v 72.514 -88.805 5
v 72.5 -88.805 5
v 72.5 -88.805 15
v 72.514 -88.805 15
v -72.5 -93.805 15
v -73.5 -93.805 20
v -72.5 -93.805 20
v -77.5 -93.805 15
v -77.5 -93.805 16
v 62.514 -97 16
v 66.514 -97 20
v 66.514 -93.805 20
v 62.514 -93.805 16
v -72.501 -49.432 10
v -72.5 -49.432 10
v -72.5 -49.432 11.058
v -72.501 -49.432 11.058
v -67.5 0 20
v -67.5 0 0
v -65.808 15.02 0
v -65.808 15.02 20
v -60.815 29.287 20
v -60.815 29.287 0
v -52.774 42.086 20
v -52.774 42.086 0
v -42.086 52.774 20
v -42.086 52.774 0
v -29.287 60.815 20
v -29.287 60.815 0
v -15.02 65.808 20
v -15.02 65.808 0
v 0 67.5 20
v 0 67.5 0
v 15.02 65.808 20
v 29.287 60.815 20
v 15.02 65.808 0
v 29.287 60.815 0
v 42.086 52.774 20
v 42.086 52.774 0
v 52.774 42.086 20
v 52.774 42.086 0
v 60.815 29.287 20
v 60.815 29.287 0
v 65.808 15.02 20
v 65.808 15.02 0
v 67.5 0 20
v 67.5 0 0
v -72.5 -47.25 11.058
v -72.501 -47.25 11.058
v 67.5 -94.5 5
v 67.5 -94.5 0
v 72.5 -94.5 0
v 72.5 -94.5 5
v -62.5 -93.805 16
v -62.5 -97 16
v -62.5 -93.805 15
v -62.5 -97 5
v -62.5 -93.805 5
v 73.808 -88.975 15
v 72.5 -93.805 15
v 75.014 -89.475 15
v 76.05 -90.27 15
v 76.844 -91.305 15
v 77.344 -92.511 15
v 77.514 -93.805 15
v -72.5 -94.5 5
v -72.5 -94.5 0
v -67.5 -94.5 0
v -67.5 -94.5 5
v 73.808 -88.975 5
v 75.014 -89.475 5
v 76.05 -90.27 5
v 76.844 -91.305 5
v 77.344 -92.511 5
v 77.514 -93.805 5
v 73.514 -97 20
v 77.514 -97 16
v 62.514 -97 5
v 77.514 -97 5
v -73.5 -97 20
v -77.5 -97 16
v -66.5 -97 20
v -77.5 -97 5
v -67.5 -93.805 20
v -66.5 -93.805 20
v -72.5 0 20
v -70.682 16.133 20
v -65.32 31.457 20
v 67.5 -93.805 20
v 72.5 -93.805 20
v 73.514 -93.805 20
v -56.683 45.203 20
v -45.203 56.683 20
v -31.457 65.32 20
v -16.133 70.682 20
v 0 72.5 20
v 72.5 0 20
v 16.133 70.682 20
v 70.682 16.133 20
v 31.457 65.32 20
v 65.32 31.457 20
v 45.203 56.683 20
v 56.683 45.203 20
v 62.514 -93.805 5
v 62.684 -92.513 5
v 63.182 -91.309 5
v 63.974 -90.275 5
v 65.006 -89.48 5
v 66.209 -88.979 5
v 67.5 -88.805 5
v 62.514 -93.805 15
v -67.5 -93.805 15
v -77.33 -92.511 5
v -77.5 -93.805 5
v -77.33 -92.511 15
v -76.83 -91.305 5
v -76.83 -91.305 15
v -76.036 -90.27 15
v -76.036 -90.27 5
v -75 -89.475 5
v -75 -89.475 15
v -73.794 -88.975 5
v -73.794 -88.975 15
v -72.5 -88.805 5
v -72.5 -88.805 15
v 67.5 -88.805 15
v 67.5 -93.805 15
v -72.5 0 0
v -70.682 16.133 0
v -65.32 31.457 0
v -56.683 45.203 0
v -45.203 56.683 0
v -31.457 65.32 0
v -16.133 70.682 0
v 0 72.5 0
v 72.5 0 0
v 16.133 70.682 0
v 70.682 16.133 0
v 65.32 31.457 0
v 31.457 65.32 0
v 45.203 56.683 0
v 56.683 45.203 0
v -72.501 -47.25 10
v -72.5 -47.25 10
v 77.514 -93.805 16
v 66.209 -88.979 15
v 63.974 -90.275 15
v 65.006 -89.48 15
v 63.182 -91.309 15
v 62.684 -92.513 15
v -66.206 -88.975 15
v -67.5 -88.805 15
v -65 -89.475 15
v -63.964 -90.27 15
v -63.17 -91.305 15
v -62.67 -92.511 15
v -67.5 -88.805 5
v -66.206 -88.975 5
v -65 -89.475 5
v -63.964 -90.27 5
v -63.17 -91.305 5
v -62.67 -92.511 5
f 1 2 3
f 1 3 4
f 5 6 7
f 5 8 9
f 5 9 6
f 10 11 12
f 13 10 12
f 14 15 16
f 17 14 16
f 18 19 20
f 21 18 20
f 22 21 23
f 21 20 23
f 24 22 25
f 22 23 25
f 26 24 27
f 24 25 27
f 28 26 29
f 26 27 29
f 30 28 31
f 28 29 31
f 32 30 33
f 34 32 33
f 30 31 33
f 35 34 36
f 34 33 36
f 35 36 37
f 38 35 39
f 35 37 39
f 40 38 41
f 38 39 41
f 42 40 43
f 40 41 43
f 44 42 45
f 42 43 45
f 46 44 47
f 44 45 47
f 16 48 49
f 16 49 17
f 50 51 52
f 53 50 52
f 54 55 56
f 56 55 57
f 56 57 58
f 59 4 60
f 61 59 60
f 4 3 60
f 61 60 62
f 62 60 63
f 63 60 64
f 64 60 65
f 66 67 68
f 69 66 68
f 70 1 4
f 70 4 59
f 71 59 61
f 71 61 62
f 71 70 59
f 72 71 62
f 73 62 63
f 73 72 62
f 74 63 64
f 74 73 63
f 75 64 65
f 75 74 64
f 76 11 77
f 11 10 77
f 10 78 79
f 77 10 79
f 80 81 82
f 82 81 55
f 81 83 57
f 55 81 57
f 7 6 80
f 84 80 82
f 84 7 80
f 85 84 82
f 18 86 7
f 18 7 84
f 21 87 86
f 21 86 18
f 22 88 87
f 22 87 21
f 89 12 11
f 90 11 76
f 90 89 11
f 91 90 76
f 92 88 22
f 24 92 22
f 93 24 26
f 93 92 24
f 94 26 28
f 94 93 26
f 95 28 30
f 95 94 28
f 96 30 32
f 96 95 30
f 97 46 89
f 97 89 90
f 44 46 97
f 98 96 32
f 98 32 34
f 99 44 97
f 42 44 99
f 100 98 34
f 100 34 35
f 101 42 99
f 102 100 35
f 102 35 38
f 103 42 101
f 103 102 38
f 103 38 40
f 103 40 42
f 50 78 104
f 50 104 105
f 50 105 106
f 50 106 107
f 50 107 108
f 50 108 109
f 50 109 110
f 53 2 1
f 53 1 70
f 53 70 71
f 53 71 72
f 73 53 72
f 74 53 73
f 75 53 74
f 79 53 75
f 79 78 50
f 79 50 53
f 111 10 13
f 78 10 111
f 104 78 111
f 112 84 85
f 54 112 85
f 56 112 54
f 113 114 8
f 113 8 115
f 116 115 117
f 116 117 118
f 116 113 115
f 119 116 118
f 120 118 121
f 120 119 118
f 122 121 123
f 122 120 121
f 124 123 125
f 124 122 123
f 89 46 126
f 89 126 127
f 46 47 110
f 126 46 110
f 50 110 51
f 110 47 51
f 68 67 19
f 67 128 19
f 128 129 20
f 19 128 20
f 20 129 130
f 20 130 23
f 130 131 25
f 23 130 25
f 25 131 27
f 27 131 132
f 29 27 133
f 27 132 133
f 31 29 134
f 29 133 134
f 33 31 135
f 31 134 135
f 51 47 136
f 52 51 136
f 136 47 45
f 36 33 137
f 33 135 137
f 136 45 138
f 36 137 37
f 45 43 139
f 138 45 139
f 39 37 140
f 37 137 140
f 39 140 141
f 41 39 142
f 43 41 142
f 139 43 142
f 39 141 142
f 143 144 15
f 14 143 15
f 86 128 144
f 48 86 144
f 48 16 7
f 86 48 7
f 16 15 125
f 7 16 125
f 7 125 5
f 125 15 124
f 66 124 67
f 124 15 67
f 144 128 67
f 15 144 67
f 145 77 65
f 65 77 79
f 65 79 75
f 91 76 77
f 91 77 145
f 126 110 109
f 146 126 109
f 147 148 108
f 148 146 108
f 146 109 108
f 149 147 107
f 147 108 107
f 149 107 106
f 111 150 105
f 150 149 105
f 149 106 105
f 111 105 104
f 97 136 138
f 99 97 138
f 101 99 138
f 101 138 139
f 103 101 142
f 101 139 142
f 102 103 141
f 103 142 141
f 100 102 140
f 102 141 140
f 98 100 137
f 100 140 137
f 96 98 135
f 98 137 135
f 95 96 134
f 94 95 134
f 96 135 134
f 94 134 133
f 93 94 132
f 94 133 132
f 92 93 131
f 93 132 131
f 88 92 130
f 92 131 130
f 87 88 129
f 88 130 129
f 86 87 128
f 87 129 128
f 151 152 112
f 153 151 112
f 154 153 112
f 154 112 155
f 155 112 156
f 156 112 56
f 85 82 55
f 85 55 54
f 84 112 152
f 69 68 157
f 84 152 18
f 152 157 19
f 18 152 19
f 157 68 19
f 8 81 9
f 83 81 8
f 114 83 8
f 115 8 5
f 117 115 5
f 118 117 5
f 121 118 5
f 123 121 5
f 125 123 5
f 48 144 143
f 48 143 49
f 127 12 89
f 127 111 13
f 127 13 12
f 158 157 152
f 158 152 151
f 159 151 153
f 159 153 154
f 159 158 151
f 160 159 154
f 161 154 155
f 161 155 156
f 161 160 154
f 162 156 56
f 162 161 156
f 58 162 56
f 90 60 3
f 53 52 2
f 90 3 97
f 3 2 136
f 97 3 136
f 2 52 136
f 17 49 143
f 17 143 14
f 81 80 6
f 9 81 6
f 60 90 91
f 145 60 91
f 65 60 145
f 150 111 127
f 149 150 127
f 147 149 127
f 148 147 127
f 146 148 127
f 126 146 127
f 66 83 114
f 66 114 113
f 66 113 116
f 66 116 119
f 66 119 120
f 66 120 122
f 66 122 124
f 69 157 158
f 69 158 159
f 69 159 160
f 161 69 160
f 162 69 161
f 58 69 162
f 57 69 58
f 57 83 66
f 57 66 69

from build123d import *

# Parameters (mm, degrees)
F0_W        = 5
F0_H        = 5
F1_DEPTH    = 20
F2_W        = 2.1819349527
F2_H        = 1.0583491623
F3_DEPTH    = 0.001
F5_DEPTH    = 5
F6_T1_DEPTH = 35
F6_T6_DEPTH = 35
F7_W        = 15
F7_H        = 3.1949503422
F8_DEPTH    = 5
F9_W        = 15
F9_H        = 3.1949481368
F10_DEPTH   = 5
F11_SIZE    = 4


# Not quite as in the source:
# - a fillet or chamfer that OpenCascade refuses, or shapes differently, is made with other operations: its cross-section is extruded or revolved along the edge and cut away or added


with BuildPart() as f1:
    # F0 (on Top) → F1 (new body)
    with BuildSketch(Plane.XY):
        with Locations((-70, -92)):
            Rectangle(F0_W, F0_H)
        with Locations((70, -92)):
            Rectangle(F0_W, F0_H)
        with BuildLine():
            Line((-67.5, -89.5), (-67.5, -26.4575131106))
            ThreePointArc((-67.5, -26.4575131106), (-71.2390342439, -13.4629120178), (-72.5, 0))
            Line((-72.5, 0), (-72.5, -89.5))
            Line((-72.5, -89.5), (-67.5, -89.5))
        make_face()
        with BuildLine():
            ThreePointArc((72.5, 0), (71.2390342439, -13.4629120178), (67.5, -26.4575131106))
            Line((67.5, -26.4575131106), (67.5, -89.5))
            Line((67.5, -89.5), (72.5, -89.5))
            Line((72.5, -89.5), (72.5, 0))
        make_face()
        with BuildLine():
            ThreePointArc((-67.5, 0), (0, 67.5), (67.5, 0))
            Line((67.5, 0), (67.5, -26.4575131106))
            ThreePointArc((67.5, -26.4575131106), (71.2390342439, -13.4629120178), (72.5, 0))
            ThreePointArc((72.5, 0), (0, 72.5), (-72.5, 0))
            ThreePointArc((-72.5, 0), (-71.2390342439, -13.4629120178), (-67.5, -26.4575131106))
            Line((-67.5, -26.4575131106), (-67.5, 0))
        make_face()
    extrude(amount=F1_DEPTH)

    # F2 (on face) → F3 (join)
    with BuildSketch(Plane(origin=(-72.5, 0, 0), x_dir=(0, -1, 0), z_dir=(-1, 0, 0))):
        with Locations((48.3409674764, 10.5291745812)):
            Rectangle(F2_W, F2_H)
    extrude(amount=F3_DEPTH)

    # F4 (on face) → F5 (join, symmetric)
    with BuildSketch(Plane(origin=(0, 0, 10), x_dir=(1, 0, 0), z_dir=(0, 0, -1))):
        Polygon((-67.5, 94.5), (-72.5, 94.5), (-77.5, 94.5), (-77.5, 88.8050496578), (-62.5, 88.8050496578), (-62.5, 94.5), align=None)
        Polygon((-77.5, 94.5), (-72.5, 94.5), (-67.5, 94.5), (-62.5, 94.5), (-62.5, 97), (-77.5, 97), align=None)
        Polygon((72.5142157078, 94.4999977946), (67.5142157078, 94.4999977946), (62.5142157078, 94.4999977946), (62.5142157078, 88.8050496578), (77.5142157078, 88.8050496578), (77.5142157078, 94.4999977946), align=None)
        Polygon((62.5142157078, 94.4999977946), (67.5142157078, 94.4999977946), (72.5142157078, 94.4999977946), (77.5142157078, 94.4999977946), (77.5142157078, 96.9999977946), (62.5142157078, 96.9999977946), align=None)
    extrude(amount=F5_DEPTH, both=True)

    # F6: fillet of radius 5 on 4 edges, made by hand

    # F6_s2 → F6_t1 (cut)
    with BuildSketch(Plane.XY.offset(-7.5)):
        with BuildLine():
            ThreePointArc((-77.5, -93.8050496578), (-76.0355339059, -90.2695157519), (-72.5, -88.8050496578))
            Line((-72.5, -88.8050496578), (-77.5, -88.8050496578))
            Line((-77.5, -88.8050496578), (-77.5, -93.8050496578))
        make_face()
        with BuildLine():
            ThreePointArc((72.5142157078, -88.8050496578), (76.0497496137, -90.2695157519), (77.5142157078, -93.8050496578))
            Line((77.5142157078, -93.8050496578), (77.5142157078, -88.8050496578))
            Line((77.5142157078, -88.8050496578), (72.5142157078, -88.8050496578))
        make_face()
        with BuildLine():
            ThreePointArc((-67.5, -88.8050496578), (-63.9644660941, -90.2695157519), (-62.5, -93.8050496578))
            Line((-62.5, -93.8050496578), (-62.5, -88.8050496578))
            Line((-62.5, -88.8050496578), (-67.5, -88.8050496578))
        make_face()
    extrude(amount=F6_T1_DEPTH, mode=Mode.SUBTRACT)


with BuildPart() as f6_tool4:
    # F6_s5 → F6_t6 (new body)
    with BuildSketch(Plane.XY.offset(-7.5)):
        with BuildLine():
            ThreePointArc((67.5142157078, -88.8050496578), (63.9786818018, -90.2695157519), (62.5142157078, -93.8050496578))
            Line((62.5142157078, -93.8050496578), (62.5142157078, -88.8050496578))
            Line((62.5142157078, -88.8050496578), (67.5142157078, -88.8050496578))
        make_face()
    extrude(amount=F6_T6_DEPTH)

    split(bisect_by=Plane.YZ.offset(67.5), keep=Keep.BOTTOM)


with BuildPart() as f1_1:
    add(f1.part)

    # F6_t3: cut F6_tool4
    add(f6_tool4.part, mode=Mode.SUBTRACT)

    # F7 (on face) → F8 (join)
    with BuildSketch(Plane.XY.offset(15)):
        with Locations((-70, -95.4025248289)):
            Rectangle(F7_W, F7_H)
    extrude(amount=F8_DEPTH)

    # F9 (on face) → F10 (join)
    with BuildSketch(Plane.XY.offset(15)):
        with Locations((70.0142157078, -95.4025237262)):
            Rectangle(F9_W, F9_H)
    extrude(amount=F10_DEPTH)

    # F11
    f11_edges = [f1_1.edges().sort_by_distance(p)[0] for p in [
        (-77.5, -95.402525, 20),
        (62.514216, -95.402524, 20),
        (-62.5, -95.402525, 20),
        (77.514216, -95.402524, 20),
    ]]
    chamfer(f11_edges, length=F11_SIZE)


solid = f1_1.part
